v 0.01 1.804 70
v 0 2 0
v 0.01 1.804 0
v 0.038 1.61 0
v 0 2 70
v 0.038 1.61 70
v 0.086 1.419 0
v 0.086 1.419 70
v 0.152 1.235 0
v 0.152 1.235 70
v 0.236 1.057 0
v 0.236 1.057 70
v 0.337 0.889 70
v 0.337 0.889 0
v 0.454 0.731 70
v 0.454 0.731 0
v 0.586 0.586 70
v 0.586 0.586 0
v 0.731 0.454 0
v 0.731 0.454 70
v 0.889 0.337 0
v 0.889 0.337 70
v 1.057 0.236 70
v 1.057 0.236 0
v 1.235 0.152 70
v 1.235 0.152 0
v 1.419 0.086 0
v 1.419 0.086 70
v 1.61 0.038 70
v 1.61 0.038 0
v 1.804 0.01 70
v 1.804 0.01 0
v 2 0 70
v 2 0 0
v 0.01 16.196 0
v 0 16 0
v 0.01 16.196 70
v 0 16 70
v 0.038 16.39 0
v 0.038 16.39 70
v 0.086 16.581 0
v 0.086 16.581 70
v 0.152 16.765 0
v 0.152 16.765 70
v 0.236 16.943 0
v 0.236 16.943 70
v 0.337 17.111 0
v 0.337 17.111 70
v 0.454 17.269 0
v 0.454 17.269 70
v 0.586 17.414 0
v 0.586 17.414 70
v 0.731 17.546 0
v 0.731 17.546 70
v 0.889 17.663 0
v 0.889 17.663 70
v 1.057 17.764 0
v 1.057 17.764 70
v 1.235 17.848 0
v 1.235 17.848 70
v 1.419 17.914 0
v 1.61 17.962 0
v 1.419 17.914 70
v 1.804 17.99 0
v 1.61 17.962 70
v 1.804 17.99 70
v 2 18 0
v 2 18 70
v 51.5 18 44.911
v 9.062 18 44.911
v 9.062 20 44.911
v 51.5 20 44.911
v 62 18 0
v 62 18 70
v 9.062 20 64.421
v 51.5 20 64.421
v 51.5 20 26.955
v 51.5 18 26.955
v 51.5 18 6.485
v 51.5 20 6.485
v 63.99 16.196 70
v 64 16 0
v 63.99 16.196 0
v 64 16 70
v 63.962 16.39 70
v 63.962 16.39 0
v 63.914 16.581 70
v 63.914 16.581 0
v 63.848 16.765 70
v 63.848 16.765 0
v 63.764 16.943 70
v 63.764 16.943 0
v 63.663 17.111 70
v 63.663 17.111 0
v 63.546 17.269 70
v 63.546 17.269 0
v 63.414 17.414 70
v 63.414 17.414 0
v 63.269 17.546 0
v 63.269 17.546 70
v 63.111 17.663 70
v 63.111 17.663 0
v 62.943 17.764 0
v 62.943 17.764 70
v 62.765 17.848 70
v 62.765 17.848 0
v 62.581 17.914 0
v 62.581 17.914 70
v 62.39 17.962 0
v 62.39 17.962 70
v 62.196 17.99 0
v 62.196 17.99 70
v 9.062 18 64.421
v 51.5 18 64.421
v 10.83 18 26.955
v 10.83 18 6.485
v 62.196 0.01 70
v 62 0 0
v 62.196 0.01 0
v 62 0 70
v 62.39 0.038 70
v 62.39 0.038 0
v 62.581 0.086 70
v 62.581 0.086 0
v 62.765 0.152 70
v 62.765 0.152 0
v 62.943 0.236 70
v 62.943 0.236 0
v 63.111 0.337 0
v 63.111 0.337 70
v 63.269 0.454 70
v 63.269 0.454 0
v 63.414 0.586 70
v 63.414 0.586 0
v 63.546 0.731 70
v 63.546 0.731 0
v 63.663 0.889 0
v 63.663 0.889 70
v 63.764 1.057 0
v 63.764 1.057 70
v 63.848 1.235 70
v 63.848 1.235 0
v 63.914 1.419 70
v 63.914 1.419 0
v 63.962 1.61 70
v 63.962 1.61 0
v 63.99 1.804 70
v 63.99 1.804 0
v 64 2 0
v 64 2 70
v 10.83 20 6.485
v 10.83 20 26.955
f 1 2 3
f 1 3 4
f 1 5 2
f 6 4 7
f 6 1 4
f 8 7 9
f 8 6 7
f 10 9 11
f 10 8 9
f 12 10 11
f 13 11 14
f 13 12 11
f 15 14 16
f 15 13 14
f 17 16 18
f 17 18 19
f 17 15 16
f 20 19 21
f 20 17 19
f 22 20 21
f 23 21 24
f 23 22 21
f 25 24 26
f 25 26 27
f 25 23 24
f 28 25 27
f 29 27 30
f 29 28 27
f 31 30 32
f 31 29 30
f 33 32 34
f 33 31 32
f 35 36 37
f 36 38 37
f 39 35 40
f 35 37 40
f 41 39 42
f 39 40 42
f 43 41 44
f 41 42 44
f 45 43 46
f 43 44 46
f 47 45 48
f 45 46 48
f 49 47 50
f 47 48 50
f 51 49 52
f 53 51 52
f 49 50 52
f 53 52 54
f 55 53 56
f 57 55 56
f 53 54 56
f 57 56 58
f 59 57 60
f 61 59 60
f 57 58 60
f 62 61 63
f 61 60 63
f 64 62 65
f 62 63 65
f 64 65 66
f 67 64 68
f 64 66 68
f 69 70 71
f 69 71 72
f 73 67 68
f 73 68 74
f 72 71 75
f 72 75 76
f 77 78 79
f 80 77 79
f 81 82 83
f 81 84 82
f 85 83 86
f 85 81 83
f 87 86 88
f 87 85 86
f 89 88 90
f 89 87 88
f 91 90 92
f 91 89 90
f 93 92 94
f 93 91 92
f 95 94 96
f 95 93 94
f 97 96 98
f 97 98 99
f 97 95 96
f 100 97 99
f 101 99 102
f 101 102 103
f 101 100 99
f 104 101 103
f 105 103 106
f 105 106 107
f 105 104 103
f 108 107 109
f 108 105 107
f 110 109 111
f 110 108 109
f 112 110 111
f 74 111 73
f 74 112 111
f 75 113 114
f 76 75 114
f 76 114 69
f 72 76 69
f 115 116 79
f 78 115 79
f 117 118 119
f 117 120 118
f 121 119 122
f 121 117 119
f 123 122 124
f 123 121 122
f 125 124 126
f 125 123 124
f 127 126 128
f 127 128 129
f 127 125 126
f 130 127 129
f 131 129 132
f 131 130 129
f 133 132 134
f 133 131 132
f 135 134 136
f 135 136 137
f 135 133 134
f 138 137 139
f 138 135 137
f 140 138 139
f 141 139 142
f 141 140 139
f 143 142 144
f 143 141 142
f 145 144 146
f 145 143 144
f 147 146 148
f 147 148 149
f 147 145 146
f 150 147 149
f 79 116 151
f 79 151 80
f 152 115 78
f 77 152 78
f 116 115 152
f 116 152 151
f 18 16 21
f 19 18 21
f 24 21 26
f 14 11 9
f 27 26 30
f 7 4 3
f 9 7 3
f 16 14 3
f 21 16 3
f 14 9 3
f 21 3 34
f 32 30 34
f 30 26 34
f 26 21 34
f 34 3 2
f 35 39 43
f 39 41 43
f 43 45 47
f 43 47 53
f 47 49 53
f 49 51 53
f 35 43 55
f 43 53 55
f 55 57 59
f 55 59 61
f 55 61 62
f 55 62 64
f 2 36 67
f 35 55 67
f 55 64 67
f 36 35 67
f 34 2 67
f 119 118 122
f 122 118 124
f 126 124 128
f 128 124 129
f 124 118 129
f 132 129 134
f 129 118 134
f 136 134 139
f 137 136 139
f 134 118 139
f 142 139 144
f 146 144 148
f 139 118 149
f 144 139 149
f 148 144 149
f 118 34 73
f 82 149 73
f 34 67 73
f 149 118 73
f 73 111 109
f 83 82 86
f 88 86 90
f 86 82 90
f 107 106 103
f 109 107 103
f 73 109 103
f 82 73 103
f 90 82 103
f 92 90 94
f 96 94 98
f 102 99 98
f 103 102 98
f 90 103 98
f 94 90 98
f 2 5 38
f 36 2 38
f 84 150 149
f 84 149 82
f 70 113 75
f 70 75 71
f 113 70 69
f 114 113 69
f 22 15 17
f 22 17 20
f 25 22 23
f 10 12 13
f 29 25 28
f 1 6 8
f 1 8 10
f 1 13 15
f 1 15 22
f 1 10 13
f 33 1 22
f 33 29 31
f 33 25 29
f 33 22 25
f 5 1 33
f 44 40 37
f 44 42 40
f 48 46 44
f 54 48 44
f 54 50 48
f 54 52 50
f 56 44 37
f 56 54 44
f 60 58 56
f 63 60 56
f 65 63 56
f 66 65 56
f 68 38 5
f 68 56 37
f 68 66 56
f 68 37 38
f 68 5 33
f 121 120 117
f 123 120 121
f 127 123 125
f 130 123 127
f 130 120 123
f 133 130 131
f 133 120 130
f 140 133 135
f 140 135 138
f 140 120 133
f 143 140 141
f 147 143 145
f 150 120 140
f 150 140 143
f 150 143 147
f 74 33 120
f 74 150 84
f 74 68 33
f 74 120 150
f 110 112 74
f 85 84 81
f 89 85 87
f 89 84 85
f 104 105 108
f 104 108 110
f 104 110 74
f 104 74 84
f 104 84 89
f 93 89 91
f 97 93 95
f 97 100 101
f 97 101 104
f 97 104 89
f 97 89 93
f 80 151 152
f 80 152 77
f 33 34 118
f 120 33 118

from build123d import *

# Parameters (mm, degrees)
SKETCH_1_W        = 64
SKETCH_1_H        = 18
EXTRUDE_1_DEPTH   = 70
FILLET_1_R        = 2
SKETCH_2_W        = 42.438172009
SKETCH_2_H        = 19.50989992
EXTRUDE_2_DEPTH   = 2
SKETCH_2_W_2      = 40.669439651
SKETCH_2_H_2      = 20.470186346
EXTRUDE_2_2_DEPTH = 2


with BuildPart() as part:
    # 草圖1 → 填料-伸長1 (new body)
    with BuildSketch(Plane.XY):
        with Locations((32, 9)):
            Rectangle(SKETCH_1_W, SKETCH_1_H)
    extrude(amount=EXTRUDE_1_DEPTH)

    # 圓角1
    fillet_1_edges = [part.edges().sort_by_distance(p)[0] for p in [
        (0, 18, 35),
        (64, 18, 35),
        (64, 0, 35),
        (0, 0, 35),
    ]]
    fillet(fillet_1_edges, radius=FILLET_1_R)


with BuildPart() as body_2:
    # 草圖2 → 填料-伸長2 (new body)
    with BuildSketch(Plane(origin=(0, 18, 0), x_dir=(1, 0, 0), z_dir=(0, 1, 0))):
        with Locations((30.280601754, -54.666211253)):
            Rectangle(SKETCH_2_W, SKETCH_2_H)
    extrude(amount=EXTRUDE_2_DEPTH)


with BuildPart() as body_3:
    # 草圖2 → Extrude 2 2 (new body)
    with BuildSketch(Plane(origin=(0, 18, 0), x_dir=(1, 0, 0), z_dir=(0, 1, 0))):
        with Locations((31.164967933, -16.72022809)):
            Rectangle(SKETCH_2_W_2, SKETCH_2_H_2)
    extrude(amount=EXTRUDE_2_2_DEPTH)


solid = Compound([part.part, body_2.part, body_3.part])
